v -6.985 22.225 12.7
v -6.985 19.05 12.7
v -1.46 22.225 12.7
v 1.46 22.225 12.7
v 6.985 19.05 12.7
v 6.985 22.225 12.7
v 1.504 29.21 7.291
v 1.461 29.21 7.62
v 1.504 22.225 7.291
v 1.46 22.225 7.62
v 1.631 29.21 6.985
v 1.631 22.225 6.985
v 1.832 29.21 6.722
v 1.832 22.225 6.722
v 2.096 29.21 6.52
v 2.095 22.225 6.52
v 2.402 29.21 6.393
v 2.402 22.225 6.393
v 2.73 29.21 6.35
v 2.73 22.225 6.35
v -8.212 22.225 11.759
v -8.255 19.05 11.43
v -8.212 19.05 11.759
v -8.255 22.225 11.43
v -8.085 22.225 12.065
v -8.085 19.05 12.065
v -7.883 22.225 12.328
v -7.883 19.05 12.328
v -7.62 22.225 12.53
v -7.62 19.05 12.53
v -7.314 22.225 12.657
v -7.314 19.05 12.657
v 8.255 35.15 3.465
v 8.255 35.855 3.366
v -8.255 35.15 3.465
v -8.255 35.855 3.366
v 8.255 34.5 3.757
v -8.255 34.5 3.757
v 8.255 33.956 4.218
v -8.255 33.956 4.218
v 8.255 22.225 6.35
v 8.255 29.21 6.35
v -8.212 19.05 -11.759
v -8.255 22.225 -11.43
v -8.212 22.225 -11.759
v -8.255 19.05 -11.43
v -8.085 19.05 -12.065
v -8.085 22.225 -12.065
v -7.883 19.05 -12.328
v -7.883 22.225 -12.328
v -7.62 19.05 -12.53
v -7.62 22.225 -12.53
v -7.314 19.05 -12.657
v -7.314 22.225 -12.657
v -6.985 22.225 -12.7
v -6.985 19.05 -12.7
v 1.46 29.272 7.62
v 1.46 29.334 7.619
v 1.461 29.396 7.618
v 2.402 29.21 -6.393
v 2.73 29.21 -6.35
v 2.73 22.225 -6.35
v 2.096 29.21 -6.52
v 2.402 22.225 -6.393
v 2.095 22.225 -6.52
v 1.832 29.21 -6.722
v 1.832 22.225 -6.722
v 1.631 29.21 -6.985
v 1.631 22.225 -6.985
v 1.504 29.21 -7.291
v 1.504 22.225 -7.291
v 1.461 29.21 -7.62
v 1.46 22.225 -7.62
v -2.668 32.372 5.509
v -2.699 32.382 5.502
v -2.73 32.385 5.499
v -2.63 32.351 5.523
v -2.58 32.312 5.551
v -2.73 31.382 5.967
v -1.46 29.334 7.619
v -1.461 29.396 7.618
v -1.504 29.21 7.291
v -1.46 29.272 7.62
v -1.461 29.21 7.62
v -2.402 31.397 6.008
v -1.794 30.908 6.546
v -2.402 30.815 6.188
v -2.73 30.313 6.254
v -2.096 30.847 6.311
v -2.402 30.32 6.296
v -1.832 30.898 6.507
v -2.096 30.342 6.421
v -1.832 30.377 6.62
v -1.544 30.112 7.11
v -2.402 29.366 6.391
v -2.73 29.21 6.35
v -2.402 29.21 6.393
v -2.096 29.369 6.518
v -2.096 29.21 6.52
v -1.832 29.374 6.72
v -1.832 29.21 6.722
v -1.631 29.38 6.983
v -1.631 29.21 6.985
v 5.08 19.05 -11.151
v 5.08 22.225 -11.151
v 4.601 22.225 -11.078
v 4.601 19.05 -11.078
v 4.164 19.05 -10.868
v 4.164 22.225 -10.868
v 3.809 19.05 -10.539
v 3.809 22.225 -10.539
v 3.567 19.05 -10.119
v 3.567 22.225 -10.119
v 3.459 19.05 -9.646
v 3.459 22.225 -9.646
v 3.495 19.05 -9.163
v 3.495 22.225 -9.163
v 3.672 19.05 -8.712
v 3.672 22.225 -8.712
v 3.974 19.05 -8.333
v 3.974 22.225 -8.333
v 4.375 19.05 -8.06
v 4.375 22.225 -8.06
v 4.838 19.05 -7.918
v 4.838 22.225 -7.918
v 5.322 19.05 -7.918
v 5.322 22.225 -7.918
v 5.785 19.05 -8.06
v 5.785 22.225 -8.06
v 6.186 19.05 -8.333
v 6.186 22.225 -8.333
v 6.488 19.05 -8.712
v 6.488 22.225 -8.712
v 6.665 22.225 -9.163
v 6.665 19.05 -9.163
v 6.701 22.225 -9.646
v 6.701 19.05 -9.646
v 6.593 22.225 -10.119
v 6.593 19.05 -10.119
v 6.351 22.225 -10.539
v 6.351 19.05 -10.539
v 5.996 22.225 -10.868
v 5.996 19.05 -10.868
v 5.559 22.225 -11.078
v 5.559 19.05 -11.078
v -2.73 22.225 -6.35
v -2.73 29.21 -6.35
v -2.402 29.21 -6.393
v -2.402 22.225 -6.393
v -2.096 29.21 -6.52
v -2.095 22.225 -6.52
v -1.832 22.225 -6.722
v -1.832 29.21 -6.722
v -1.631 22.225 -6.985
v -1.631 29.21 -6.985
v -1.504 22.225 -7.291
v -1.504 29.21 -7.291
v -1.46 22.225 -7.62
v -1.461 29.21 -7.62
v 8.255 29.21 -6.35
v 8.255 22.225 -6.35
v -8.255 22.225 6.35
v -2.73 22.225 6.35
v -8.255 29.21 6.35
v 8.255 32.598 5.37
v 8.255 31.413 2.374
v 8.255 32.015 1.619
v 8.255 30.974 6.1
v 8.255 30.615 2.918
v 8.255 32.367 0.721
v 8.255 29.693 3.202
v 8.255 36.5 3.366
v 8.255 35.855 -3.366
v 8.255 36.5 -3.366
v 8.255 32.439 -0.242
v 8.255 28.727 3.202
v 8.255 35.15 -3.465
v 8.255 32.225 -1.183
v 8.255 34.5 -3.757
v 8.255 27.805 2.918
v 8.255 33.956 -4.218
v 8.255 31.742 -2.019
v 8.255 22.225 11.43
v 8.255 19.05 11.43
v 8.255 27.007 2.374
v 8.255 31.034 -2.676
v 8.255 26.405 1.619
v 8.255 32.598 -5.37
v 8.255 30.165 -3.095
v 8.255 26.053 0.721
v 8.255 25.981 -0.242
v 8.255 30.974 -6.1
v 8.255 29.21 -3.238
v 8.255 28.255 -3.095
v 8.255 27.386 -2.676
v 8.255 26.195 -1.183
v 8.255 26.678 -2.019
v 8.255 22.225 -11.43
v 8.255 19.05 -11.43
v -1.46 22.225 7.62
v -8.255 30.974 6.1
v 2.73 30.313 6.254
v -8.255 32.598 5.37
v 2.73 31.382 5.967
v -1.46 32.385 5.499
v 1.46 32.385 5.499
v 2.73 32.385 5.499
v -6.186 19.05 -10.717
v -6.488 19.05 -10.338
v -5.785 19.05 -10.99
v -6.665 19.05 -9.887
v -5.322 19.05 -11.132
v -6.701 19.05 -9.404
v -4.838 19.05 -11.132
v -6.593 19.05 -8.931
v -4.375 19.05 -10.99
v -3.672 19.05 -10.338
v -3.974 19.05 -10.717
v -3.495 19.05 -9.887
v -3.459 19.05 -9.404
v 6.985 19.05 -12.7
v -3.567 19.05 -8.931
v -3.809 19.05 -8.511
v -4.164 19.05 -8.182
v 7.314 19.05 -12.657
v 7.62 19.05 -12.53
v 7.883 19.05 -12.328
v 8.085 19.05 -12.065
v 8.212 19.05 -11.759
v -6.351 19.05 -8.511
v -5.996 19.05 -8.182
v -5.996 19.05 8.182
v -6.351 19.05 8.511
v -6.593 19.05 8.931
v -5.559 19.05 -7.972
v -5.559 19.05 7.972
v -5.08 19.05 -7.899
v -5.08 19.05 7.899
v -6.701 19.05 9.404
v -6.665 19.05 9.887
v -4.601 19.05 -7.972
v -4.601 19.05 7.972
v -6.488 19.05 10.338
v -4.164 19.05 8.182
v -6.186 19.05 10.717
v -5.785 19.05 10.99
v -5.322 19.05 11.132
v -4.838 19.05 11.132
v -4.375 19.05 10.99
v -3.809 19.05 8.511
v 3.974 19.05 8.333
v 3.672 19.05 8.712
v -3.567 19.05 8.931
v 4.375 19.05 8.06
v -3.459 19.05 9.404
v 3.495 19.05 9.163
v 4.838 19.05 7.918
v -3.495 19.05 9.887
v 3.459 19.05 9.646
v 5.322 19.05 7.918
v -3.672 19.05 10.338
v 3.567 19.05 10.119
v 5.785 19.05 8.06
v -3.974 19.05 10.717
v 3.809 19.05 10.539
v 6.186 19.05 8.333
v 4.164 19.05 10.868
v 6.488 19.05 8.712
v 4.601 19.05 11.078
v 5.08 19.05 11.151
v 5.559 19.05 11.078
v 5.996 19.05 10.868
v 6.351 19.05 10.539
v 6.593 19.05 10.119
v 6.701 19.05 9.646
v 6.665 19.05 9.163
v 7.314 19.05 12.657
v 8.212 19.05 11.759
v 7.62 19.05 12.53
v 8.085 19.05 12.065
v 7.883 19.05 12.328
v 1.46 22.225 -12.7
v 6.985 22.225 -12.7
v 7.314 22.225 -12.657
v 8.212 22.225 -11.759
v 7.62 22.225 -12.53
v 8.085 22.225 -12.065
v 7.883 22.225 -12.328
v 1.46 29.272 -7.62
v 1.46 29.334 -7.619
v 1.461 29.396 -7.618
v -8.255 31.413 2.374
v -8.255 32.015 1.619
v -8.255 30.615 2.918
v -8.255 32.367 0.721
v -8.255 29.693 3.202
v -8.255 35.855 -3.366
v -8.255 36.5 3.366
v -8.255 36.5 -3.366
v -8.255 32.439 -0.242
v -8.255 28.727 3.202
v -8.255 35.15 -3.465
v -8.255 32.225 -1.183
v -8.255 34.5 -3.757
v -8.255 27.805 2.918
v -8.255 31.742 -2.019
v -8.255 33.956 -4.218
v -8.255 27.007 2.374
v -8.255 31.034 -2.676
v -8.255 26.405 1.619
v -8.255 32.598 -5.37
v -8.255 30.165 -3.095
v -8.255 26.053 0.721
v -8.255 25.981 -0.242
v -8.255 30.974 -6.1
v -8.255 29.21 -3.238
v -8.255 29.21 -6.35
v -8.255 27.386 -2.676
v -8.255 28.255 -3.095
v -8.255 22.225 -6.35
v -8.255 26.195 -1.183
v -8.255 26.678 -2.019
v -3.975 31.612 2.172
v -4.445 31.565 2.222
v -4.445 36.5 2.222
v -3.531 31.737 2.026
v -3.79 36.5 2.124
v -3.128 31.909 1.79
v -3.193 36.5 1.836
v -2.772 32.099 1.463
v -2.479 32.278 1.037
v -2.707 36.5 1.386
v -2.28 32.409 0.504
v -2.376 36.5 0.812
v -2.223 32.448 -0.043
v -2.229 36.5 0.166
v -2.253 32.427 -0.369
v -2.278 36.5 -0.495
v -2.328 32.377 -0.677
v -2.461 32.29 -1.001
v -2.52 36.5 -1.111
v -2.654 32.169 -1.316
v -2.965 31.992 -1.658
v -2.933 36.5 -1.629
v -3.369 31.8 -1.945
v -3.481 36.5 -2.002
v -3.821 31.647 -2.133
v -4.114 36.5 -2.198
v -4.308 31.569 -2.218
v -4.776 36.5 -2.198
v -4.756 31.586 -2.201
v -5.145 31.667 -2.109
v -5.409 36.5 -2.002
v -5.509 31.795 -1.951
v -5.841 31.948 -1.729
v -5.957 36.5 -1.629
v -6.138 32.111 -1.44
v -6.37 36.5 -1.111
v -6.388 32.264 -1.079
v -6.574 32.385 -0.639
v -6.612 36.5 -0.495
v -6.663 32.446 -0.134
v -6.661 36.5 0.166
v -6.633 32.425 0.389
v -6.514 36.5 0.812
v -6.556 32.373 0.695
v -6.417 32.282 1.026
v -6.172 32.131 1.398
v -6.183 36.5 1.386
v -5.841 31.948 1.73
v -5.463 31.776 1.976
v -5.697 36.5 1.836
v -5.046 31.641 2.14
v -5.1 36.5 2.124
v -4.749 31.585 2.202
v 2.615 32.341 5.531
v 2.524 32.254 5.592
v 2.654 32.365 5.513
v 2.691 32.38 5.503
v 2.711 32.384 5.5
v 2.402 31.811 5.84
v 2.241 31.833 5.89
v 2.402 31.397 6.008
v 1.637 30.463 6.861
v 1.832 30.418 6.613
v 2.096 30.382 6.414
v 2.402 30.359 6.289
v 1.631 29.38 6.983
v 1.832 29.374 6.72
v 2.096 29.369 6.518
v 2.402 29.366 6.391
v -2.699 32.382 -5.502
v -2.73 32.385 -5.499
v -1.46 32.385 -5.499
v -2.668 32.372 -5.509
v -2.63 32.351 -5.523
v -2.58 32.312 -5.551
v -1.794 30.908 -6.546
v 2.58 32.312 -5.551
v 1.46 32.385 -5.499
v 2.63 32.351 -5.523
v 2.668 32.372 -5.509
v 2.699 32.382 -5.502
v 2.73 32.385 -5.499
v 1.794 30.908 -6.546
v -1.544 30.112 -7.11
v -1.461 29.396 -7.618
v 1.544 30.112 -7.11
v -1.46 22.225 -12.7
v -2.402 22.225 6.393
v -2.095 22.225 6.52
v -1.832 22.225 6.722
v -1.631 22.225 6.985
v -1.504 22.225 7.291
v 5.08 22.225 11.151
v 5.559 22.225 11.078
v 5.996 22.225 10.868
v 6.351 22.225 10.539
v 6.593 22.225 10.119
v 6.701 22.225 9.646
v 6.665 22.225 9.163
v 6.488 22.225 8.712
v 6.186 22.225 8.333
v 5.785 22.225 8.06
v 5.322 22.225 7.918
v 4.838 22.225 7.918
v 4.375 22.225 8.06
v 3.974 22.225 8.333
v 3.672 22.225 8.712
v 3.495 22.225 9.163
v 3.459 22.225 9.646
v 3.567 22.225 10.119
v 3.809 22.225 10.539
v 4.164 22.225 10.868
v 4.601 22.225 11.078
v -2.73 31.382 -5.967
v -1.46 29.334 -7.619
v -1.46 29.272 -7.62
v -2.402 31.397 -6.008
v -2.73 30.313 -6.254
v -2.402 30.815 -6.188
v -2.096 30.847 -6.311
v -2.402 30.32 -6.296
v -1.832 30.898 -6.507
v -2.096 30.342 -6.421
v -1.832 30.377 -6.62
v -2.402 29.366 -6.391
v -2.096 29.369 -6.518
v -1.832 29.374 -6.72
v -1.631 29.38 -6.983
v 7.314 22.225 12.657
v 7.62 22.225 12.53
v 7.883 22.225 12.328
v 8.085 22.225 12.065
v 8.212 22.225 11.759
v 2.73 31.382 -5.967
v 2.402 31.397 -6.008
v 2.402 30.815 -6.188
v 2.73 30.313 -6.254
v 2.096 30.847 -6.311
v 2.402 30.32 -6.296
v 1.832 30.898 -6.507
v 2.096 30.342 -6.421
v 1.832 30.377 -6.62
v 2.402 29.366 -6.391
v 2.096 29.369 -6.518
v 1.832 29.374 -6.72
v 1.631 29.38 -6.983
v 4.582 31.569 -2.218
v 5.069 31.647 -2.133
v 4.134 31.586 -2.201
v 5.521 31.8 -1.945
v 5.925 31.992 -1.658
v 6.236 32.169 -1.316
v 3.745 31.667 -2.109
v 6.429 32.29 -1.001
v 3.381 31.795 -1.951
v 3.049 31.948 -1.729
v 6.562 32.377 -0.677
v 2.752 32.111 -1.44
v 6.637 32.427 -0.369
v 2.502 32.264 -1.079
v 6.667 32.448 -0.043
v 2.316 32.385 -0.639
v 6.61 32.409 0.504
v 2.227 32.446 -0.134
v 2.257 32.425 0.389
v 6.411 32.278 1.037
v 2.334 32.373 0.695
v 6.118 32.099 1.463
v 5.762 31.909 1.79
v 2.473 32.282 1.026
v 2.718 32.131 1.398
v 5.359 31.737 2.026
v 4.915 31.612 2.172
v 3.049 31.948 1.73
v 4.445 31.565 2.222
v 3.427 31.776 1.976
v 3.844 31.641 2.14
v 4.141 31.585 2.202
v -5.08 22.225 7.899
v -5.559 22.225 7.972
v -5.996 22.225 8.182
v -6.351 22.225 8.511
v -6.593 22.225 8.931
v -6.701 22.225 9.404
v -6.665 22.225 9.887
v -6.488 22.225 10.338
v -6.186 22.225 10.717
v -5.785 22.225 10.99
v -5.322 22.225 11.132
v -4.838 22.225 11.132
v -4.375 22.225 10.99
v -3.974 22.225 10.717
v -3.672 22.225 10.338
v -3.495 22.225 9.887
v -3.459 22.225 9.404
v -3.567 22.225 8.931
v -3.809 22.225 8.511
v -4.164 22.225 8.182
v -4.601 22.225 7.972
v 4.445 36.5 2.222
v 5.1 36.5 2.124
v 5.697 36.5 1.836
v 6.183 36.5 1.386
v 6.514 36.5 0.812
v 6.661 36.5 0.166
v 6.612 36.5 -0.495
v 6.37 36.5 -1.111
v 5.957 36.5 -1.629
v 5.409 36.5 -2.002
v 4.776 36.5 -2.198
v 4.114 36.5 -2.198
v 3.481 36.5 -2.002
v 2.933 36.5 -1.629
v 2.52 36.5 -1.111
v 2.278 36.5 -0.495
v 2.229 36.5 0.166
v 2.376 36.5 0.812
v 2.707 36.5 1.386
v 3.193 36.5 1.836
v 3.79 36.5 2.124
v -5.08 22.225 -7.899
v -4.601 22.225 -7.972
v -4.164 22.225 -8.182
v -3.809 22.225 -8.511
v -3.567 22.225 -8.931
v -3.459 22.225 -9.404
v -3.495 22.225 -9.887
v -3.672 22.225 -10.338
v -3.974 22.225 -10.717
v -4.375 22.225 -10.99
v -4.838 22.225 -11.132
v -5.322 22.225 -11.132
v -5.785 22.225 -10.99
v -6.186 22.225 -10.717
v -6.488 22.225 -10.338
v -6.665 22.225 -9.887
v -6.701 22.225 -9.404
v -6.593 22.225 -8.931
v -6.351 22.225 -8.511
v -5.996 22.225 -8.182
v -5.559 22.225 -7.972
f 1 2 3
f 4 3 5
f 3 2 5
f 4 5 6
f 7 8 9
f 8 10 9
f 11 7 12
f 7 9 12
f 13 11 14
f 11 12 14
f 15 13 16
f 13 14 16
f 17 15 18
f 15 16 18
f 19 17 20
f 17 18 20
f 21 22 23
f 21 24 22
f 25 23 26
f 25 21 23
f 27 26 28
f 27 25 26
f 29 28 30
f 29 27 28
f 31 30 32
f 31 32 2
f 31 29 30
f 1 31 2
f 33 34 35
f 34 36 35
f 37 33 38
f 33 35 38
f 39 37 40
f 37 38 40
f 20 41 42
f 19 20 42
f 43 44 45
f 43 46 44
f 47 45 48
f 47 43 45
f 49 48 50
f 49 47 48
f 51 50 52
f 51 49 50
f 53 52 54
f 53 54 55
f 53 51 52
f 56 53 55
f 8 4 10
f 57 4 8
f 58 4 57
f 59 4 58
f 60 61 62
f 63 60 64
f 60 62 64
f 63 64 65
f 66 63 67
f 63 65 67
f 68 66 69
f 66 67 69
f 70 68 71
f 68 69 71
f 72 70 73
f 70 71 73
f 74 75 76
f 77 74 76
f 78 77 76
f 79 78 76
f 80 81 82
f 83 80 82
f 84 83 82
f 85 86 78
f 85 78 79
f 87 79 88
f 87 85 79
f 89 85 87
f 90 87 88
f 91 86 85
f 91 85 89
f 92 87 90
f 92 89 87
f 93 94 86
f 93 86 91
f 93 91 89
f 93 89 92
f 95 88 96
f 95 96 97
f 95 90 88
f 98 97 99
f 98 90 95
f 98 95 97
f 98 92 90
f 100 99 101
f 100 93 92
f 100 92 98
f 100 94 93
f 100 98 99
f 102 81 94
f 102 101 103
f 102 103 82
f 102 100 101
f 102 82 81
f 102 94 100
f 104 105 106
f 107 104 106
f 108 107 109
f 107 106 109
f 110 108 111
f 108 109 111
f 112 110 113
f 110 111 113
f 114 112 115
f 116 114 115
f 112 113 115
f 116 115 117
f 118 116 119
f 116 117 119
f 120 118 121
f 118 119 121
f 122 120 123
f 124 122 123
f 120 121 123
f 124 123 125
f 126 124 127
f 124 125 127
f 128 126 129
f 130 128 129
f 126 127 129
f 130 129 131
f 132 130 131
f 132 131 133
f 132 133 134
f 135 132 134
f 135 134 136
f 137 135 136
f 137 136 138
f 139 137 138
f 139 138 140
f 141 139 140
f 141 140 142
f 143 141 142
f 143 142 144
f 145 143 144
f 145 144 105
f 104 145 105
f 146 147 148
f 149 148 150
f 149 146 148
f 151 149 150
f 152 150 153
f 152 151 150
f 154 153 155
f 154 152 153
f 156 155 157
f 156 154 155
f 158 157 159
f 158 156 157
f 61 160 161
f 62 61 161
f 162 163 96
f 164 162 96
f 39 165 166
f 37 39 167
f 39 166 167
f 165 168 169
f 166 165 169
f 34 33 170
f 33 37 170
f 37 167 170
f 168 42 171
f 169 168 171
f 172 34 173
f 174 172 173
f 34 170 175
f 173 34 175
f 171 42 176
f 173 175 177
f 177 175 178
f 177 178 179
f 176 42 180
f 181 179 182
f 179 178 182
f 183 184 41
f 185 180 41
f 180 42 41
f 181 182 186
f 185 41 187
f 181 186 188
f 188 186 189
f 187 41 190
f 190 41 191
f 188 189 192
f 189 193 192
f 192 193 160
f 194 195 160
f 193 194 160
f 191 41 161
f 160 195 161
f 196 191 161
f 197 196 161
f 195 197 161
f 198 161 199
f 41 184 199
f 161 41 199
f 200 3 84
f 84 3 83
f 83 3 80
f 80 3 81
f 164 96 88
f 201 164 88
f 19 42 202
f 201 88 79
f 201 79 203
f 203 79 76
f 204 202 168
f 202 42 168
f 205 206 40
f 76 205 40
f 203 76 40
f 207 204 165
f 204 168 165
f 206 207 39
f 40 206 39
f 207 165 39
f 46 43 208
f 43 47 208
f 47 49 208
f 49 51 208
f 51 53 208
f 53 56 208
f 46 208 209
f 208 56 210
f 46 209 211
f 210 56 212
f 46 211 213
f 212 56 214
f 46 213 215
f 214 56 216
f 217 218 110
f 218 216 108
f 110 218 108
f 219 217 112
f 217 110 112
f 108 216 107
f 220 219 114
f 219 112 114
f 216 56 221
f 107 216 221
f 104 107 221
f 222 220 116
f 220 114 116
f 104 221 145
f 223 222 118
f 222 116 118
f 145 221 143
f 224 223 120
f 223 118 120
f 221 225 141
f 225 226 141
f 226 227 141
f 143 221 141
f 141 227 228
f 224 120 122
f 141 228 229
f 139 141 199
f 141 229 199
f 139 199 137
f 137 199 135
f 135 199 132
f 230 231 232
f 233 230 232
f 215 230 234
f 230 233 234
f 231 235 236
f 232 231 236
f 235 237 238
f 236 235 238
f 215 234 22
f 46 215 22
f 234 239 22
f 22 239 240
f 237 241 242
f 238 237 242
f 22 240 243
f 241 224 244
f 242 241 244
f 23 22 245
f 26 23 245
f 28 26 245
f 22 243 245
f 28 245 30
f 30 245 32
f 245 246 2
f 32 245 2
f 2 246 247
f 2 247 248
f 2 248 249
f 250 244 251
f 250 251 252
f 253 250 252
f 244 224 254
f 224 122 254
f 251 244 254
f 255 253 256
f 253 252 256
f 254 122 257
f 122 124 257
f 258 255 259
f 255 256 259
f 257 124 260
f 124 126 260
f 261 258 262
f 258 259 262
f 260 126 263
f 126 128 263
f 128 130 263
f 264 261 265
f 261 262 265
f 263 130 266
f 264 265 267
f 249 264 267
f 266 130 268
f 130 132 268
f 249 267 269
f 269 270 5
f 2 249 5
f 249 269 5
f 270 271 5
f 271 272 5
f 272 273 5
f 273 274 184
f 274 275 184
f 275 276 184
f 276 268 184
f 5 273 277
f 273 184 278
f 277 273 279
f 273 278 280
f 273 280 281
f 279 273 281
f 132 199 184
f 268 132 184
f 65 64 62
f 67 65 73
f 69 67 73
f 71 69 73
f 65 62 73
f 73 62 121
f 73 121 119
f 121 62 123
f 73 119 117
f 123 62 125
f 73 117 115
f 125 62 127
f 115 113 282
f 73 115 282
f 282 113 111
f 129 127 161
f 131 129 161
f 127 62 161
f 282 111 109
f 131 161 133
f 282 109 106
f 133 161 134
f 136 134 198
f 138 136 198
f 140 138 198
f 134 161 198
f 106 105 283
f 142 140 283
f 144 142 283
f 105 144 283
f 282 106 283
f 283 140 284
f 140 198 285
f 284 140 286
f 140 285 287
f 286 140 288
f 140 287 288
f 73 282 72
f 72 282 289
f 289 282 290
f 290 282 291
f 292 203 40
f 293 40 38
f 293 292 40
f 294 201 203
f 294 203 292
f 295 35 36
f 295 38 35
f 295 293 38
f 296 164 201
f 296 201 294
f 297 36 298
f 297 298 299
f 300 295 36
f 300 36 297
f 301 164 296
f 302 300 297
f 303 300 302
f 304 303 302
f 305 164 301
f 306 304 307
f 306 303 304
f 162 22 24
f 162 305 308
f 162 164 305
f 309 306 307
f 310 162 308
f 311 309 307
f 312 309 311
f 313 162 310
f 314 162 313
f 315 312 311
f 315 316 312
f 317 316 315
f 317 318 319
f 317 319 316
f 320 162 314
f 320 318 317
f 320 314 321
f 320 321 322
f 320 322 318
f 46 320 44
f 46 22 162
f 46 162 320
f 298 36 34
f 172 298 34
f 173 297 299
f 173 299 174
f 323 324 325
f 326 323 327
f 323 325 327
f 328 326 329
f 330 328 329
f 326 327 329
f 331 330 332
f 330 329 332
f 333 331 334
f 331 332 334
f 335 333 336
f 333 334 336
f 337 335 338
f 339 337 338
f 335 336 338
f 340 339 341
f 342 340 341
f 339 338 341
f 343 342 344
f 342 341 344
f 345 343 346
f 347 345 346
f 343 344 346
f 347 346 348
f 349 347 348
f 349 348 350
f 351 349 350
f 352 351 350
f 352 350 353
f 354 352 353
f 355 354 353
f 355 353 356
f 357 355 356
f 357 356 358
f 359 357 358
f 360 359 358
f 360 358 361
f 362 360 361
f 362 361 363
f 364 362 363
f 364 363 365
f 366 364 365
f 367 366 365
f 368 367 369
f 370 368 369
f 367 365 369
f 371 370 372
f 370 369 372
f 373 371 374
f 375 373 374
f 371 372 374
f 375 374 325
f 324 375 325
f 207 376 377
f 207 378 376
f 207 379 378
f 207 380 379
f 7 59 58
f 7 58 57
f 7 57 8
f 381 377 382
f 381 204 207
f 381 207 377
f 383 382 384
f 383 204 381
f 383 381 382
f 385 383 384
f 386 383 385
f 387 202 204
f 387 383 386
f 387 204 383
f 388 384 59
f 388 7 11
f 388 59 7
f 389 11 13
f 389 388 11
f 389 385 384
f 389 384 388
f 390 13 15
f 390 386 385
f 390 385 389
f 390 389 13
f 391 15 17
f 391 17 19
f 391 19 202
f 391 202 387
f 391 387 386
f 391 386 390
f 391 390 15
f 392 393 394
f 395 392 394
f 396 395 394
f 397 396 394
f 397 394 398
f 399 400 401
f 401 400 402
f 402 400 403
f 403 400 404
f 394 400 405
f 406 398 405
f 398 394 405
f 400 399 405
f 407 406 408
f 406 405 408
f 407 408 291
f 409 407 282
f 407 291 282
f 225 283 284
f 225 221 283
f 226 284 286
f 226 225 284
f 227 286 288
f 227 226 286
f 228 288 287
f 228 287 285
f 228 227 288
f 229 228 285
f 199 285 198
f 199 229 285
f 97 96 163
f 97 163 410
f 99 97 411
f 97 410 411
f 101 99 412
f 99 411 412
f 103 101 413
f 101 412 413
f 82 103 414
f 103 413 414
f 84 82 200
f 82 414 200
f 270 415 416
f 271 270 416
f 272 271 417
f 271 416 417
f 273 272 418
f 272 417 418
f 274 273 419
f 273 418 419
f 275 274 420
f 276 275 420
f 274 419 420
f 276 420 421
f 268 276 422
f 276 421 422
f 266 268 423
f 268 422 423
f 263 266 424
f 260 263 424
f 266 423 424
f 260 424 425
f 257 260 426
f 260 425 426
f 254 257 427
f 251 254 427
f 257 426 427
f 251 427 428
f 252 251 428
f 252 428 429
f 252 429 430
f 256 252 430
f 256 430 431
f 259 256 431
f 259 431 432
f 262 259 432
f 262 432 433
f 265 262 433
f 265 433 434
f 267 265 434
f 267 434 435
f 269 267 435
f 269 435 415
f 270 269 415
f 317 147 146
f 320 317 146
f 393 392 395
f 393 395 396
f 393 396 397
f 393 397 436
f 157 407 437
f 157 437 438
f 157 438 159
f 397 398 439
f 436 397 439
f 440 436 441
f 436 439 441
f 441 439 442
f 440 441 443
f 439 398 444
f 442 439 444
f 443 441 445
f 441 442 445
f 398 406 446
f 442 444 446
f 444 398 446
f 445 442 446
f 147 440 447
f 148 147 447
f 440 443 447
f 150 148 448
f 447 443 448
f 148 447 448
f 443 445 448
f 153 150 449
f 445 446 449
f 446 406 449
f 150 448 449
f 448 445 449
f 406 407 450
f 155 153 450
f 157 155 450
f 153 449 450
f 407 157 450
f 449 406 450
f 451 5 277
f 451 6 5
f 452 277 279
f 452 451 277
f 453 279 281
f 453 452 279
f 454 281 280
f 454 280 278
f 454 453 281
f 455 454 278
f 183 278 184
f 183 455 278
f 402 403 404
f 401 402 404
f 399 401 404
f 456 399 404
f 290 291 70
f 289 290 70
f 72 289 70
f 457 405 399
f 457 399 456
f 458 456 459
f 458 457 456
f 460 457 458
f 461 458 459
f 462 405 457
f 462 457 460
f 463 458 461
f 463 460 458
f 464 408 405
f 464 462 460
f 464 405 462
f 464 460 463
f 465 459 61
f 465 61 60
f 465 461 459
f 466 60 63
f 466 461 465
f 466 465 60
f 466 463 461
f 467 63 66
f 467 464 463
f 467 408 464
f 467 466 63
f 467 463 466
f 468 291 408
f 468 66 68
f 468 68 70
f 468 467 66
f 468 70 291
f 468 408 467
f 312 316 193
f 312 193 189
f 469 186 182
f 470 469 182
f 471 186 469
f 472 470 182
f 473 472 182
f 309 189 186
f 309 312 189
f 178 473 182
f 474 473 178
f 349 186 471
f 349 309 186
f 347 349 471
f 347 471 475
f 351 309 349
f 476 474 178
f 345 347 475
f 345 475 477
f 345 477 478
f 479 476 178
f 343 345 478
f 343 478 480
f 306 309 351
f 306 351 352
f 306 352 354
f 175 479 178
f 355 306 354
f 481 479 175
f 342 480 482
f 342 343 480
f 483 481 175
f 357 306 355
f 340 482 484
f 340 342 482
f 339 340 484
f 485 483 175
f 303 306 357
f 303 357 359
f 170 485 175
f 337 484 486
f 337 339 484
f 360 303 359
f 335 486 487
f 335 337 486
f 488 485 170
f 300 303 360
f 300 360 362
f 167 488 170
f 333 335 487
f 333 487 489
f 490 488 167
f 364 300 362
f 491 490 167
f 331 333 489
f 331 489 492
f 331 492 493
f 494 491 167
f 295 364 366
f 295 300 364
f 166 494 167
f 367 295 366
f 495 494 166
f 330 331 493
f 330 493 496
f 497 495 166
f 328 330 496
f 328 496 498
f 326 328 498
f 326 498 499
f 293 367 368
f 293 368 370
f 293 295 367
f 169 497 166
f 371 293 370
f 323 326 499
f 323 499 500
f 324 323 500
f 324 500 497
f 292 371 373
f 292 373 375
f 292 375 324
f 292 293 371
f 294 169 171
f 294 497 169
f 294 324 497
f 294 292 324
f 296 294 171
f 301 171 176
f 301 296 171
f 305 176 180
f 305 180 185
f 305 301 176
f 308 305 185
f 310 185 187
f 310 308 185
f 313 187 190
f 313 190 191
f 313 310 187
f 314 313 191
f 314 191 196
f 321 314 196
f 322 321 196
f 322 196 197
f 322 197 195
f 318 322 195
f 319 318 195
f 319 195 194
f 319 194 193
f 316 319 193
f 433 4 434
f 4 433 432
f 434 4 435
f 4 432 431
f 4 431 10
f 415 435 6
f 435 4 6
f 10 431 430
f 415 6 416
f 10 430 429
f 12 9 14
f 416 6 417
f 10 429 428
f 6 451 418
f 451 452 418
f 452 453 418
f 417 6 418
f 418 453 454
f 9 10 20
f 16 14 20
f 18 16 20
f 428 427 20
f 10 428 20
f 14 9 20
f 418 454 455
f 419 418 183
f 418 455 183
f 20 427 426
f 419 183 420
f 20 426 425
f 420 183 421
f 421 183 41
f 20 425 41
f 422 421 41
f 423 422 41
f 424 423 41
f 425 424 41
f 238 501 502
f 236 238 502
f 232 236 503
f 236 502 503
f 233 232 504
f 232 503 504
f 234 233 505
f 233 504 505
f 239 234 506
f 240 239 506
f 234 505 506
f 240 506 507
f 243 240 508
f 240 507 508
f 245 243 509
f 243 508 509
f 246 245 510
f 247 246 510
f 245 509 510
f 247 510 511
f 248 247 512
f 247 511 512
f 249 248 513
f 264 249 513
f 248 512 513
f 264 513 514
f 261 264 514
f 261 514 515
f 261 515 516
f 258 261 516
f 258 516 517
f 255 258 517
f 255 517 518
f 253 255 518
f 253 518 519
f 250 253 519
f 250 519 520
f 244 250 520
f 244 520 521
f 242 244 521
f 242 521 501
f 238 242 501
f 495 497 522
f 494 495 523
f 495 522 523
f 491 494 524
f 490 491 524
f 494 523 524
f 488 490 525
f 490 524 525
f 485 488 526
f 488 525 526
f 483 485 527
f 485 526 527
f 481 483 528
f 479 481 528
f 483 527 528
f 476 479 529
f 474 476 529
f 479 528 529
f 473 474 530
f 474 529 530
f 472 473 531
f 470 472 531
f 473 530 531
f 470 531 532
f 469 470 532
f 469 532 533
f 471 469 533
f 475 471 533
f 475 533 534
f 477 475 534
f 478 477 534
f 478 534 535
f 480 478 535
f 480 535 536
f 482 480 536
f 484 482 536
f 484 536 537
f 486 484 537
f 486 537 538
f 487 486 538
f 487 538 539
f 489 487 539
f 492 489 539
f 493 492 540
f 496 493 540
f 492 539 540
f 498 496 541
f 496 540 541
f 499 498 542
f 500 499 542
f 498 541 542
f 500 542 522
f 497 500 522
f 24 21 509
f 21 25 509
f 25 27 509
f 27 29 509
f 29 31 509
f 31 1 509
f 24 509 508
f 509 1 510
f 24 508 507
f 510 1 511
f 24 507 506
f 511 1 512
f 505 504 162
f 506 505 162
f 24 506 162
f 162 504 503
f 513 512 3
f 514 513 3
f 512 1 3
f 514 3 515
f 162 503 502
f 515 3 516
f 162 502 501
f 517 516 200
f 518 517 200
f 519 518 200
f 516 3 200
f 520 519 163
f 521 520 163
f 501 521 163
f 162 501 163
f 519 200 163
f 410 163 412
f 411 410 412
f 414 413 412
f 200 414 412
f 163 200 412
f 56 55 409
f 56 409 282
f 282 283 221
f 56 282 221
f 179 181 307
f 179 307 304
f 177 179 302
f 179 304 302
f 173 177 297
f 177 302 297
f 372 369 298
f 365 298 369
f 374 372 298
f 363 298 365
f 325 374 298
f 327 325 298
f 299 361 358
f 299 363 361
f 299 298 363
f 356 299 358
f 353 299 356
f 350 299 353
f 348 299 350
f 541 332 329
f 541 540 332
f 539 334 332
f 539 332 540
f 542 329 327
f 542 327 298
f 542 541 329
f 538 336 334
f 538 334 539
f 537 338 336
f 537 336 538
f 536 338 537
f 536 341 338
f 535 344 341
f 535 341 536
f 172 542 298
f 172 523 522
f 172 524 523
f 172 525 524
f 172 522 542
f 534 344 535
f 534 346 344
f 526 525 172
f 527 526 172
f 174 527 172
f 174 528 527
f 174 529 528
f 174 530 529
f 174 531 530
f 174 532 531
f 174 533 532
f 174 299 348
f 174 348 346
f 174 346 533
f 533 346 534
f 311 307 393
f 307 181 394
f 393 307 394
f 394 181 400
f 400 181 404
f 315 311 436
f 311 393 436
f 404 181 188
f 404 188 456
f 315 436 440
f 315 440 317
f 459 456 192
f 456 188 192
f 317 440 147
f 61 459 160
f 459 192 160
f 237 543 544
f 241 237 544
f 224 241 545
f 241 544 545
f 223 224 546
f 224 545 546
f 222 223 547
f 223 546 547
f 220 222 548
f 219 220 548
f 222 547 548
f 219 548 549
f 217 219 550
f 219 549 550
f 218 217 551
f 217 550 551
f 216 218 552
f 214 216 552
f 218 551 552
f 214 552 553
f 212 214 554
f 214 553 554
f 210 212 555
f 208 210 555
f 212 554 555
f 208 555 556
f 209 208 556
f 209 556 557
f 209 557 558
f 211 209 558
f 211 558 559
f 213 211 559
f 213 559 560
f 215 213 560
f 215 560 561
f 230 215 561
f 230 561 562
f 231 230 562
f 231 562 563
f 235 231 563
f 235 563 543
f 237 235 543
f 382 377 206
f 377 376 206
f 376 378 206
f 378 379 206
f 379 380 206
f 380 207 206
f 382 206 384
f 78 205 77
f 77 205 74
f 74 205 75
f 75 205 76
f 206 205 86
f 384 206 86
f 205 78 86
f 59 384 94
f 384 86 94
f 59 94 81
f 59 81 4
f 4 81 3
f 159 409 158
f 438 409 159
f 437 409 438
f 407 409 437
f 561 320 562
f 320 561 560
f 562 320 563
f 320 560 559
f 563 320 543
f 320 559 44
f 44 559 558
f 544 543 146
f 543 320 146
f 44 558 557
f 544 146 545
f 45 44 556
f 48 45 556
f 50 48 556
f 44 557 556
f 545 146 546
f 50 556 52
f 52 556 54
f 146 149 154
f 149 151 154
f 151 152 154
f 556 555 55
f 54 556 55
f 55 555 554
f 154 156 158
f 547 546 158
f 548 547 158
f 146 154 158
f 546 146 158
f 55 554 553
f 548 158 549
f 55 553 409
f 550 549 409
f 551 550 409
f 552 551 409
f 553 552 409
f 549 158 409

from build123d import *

# Parameters (mm, degrees)
SKETCH1_R           = 3.2385
BOSS_EXTRUDE1_DEPTH = 8.255
BOSS_EXTRUDE2_DEPTH = 1.4605
SKETCH3_R           = 1.6256
CUT_EXTRUDE1_DEPTH  = 21.180615699
CUT_EXTRUDE2_DEPTH  = 42.211451079
SKETCH6_W           = 16.51
SKETCH6_H           = 6.731
BOSS_EXTRUDE3_DEPTH = 1.905
SKETCH5_R           = 2.2225
CUT_EXTRUDE3_DEPTH  = 6.35
FILLET1_R           = 1.27
FILLET2_R           = 2.54


with BuildPart() as part:
    # Sketch1 → Boss-Extrude1 (new, symmetric)
    with BuildSketch(Plane(origin=(0, 0, 0), x_dir=(0, 0, -1), z_dir=(1, 0, 0))):
        with BuildLine():
            Line((12.7, 19.05), (-12.7, 19.05))
            Line((-12.7, 19.05), (-12.7, 22.225))
            Line((-12.7, 22.225), (-6.35, 22.225))
            Line((-6.35, 22.225), (-6.35, 29.21))
            ThreePointArc((-6.35, 29.21), (0, 35.56), (6.35, 29.21))
            Line((6.35, 29.21), (6.35, 22.225))
            Line((6.35, 22.225), (12.7, 22.225))
            Line((12.7, 22.225), (12.7, 19.05))
        make_face()
        with Locations((0, 29.21)):
            Circle(SKETCH1_R, mode=Mode.SUBTRACT)
    extrude(amount=BOSS_EXTRUDE1_DEPTH, both=True)

    # Sketch2 → Boss-Extrude2 (add, symmetric)
    with BuildSketch(Plane(origin=(0, 0, 0), x_dir=(0, 0, -1), z_dir=(1, 0, 0))):
        Polygon((-5.499261314, 32.385), (-12.7, 22.225), (-5.499261314, 22.225), align=None)
        Polygon((5.499261314, 22.225), (5.499261314, 32.385), (12.7, 22.225), align=None)
    extrude(amount=BOSS_EXTRUDE2_DEPTH, both=True)

    # Sketch3 → Cut-Extrude1 (cut, through all)
    with BuildSketch(Plane(origin=(0, 22.225, 0), x_dir=(1, 0, 0), z_dir=(0, 1, 0))):
        with Locations(Location((-5.08, 9.525, 0), (0, 0, 270))):
            Circle(SKETCH3_R)
        with Locations(Location((5.08, 9.525, 0), (0, 0, 90))):
            Circle(SKETCH3_R)
        with Locations(Location((5.08, -9.525, 0), (0, 0, 270))):
            Circle(SKETCH3_R)
        with Locations(Location((-5.08, -9.525, 0), (0, 0, 90))):
            Circle(SKETCH3_R)
    extrude(amount=-CUT_EXTRUDE1_DEPTH, mode=Mode.SUBTRACT)

    # Sketch4 → Cut-Extrude2 (cut, through all)
    with BuildSketch(Plane(origin=(8.255, 0, 0), x_dir=(0, 0, -1), z_dir=(1, 0, 0))):
        with BuildLine():
            Line((3.3655, 34.594785024), (-3.3655, 34.594785024))
            ThreePointArc((-3.3655, 34.594785024), (0, 35.56), (3.3655, 34.594785024))
        make_face()
    extrude(amount=-CUT_EXTRUDE2_DEPTH, mode=Mode.SUBTRACT)

    # Sketch6 → Boss-Extrude3 (add)
    with BuildSketch(Plane(origin=(0, 34.594785024, 0), x_dir=(1, 0, 0), z_dir=(0, 1, 0))):
        Rectangle(SKETCH6_W, SKETCH6_H)
    extrude(amount=BOSS_EXTRUDE3_DEPTH)

    # Sketch5 → Cut-Extrude3 (cut)
    with BuildSketch(Plane(origin=(0, 36.499785024, 0), x_dir=(1, 0, 0), z_dir=(0, 1, 0))):
        with Locations(Location((-4.445, 0, 0), (0, 0, 270))):
            Circle(SKETCH5_R)
        with Locations(Location((4.445, 0, 0), (0, 0, 270))):
            Circle(SKETCH5_R)
    extrude(amount=-CUT_EXTRUDE3_DEPTH, mode=Mode.SUBTRACT)

    # Fillet1
    fillet1_edges = [part.edges().sort_by_distance(p)[0] for p in [
        (-8.255, 20.6375, -12.7),
        (-8.255, 20.6375, 12.7),
        (8.255, 20.6375, -12.7),
        (1.4605, 25.7175, 6.35),
        (1.4605, 30.853500936, 6.133628997),
        (-1.4605, 25.7175, 6.35),
        (-1.4605, 30.853500936, 6.133628997),
        (-1.4605, 25.7175, -6.35),
        (1.4605, 25.7175, -6.35),
        (8.255, 20.6375, 12.7),
        (1.4605, 30.853500936, -6.133628997),
        (-1.4605, 30.853500936, -6.133628997),
    ]]
    fillet(fillet1_edges, radius=FILLET1_R)

    # Fillet2
    fillet2_edges = [part.edges().sort_by_distance(p)[0] for p in [
        (0, 34.594785024, 3.3655),
        (0, 34.594785024, -3.3655),
    ]]
    fillet(fillet2_edges, radius=FILLET2_R)


solid = part.part
